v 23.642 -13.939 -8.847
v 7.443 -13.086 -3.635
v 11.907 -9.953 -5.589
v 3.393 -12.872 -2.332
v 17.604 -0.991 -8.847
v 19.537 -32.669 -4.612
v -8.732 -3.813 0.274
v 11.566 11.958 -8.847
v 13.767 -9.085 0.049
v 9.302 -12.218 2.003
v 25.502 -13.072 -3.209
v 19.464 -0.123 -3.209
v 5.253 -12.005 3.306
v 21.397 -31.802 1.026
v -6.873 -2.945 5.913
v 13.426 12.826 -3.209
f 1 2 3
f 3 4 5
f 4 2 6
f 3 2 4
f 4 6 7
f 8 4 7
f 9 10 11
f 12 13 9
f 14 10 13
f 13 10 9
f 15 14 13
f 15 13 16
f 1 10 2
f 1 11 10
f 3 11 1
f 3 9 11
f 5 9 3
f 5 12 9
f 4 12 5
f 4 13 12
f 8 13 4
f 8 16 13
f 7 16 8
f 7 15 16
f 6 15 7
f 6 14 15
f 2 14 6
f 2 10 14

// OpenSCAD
rotate([0,20,+25]) linear_extrude(height=6,center=true){
    translate([-30, +25])
    polygon(
        points=[
            [20.955, -24.765],
            [47.625, -19.05],
            [28.575, -38.1],
            [47.625, -33.3375],
            [38.1, -39.0525],
            [47.625, -47.625],
            [32.385, -40.005],
            [35.2425, -62.865]
        ]
    );
}
